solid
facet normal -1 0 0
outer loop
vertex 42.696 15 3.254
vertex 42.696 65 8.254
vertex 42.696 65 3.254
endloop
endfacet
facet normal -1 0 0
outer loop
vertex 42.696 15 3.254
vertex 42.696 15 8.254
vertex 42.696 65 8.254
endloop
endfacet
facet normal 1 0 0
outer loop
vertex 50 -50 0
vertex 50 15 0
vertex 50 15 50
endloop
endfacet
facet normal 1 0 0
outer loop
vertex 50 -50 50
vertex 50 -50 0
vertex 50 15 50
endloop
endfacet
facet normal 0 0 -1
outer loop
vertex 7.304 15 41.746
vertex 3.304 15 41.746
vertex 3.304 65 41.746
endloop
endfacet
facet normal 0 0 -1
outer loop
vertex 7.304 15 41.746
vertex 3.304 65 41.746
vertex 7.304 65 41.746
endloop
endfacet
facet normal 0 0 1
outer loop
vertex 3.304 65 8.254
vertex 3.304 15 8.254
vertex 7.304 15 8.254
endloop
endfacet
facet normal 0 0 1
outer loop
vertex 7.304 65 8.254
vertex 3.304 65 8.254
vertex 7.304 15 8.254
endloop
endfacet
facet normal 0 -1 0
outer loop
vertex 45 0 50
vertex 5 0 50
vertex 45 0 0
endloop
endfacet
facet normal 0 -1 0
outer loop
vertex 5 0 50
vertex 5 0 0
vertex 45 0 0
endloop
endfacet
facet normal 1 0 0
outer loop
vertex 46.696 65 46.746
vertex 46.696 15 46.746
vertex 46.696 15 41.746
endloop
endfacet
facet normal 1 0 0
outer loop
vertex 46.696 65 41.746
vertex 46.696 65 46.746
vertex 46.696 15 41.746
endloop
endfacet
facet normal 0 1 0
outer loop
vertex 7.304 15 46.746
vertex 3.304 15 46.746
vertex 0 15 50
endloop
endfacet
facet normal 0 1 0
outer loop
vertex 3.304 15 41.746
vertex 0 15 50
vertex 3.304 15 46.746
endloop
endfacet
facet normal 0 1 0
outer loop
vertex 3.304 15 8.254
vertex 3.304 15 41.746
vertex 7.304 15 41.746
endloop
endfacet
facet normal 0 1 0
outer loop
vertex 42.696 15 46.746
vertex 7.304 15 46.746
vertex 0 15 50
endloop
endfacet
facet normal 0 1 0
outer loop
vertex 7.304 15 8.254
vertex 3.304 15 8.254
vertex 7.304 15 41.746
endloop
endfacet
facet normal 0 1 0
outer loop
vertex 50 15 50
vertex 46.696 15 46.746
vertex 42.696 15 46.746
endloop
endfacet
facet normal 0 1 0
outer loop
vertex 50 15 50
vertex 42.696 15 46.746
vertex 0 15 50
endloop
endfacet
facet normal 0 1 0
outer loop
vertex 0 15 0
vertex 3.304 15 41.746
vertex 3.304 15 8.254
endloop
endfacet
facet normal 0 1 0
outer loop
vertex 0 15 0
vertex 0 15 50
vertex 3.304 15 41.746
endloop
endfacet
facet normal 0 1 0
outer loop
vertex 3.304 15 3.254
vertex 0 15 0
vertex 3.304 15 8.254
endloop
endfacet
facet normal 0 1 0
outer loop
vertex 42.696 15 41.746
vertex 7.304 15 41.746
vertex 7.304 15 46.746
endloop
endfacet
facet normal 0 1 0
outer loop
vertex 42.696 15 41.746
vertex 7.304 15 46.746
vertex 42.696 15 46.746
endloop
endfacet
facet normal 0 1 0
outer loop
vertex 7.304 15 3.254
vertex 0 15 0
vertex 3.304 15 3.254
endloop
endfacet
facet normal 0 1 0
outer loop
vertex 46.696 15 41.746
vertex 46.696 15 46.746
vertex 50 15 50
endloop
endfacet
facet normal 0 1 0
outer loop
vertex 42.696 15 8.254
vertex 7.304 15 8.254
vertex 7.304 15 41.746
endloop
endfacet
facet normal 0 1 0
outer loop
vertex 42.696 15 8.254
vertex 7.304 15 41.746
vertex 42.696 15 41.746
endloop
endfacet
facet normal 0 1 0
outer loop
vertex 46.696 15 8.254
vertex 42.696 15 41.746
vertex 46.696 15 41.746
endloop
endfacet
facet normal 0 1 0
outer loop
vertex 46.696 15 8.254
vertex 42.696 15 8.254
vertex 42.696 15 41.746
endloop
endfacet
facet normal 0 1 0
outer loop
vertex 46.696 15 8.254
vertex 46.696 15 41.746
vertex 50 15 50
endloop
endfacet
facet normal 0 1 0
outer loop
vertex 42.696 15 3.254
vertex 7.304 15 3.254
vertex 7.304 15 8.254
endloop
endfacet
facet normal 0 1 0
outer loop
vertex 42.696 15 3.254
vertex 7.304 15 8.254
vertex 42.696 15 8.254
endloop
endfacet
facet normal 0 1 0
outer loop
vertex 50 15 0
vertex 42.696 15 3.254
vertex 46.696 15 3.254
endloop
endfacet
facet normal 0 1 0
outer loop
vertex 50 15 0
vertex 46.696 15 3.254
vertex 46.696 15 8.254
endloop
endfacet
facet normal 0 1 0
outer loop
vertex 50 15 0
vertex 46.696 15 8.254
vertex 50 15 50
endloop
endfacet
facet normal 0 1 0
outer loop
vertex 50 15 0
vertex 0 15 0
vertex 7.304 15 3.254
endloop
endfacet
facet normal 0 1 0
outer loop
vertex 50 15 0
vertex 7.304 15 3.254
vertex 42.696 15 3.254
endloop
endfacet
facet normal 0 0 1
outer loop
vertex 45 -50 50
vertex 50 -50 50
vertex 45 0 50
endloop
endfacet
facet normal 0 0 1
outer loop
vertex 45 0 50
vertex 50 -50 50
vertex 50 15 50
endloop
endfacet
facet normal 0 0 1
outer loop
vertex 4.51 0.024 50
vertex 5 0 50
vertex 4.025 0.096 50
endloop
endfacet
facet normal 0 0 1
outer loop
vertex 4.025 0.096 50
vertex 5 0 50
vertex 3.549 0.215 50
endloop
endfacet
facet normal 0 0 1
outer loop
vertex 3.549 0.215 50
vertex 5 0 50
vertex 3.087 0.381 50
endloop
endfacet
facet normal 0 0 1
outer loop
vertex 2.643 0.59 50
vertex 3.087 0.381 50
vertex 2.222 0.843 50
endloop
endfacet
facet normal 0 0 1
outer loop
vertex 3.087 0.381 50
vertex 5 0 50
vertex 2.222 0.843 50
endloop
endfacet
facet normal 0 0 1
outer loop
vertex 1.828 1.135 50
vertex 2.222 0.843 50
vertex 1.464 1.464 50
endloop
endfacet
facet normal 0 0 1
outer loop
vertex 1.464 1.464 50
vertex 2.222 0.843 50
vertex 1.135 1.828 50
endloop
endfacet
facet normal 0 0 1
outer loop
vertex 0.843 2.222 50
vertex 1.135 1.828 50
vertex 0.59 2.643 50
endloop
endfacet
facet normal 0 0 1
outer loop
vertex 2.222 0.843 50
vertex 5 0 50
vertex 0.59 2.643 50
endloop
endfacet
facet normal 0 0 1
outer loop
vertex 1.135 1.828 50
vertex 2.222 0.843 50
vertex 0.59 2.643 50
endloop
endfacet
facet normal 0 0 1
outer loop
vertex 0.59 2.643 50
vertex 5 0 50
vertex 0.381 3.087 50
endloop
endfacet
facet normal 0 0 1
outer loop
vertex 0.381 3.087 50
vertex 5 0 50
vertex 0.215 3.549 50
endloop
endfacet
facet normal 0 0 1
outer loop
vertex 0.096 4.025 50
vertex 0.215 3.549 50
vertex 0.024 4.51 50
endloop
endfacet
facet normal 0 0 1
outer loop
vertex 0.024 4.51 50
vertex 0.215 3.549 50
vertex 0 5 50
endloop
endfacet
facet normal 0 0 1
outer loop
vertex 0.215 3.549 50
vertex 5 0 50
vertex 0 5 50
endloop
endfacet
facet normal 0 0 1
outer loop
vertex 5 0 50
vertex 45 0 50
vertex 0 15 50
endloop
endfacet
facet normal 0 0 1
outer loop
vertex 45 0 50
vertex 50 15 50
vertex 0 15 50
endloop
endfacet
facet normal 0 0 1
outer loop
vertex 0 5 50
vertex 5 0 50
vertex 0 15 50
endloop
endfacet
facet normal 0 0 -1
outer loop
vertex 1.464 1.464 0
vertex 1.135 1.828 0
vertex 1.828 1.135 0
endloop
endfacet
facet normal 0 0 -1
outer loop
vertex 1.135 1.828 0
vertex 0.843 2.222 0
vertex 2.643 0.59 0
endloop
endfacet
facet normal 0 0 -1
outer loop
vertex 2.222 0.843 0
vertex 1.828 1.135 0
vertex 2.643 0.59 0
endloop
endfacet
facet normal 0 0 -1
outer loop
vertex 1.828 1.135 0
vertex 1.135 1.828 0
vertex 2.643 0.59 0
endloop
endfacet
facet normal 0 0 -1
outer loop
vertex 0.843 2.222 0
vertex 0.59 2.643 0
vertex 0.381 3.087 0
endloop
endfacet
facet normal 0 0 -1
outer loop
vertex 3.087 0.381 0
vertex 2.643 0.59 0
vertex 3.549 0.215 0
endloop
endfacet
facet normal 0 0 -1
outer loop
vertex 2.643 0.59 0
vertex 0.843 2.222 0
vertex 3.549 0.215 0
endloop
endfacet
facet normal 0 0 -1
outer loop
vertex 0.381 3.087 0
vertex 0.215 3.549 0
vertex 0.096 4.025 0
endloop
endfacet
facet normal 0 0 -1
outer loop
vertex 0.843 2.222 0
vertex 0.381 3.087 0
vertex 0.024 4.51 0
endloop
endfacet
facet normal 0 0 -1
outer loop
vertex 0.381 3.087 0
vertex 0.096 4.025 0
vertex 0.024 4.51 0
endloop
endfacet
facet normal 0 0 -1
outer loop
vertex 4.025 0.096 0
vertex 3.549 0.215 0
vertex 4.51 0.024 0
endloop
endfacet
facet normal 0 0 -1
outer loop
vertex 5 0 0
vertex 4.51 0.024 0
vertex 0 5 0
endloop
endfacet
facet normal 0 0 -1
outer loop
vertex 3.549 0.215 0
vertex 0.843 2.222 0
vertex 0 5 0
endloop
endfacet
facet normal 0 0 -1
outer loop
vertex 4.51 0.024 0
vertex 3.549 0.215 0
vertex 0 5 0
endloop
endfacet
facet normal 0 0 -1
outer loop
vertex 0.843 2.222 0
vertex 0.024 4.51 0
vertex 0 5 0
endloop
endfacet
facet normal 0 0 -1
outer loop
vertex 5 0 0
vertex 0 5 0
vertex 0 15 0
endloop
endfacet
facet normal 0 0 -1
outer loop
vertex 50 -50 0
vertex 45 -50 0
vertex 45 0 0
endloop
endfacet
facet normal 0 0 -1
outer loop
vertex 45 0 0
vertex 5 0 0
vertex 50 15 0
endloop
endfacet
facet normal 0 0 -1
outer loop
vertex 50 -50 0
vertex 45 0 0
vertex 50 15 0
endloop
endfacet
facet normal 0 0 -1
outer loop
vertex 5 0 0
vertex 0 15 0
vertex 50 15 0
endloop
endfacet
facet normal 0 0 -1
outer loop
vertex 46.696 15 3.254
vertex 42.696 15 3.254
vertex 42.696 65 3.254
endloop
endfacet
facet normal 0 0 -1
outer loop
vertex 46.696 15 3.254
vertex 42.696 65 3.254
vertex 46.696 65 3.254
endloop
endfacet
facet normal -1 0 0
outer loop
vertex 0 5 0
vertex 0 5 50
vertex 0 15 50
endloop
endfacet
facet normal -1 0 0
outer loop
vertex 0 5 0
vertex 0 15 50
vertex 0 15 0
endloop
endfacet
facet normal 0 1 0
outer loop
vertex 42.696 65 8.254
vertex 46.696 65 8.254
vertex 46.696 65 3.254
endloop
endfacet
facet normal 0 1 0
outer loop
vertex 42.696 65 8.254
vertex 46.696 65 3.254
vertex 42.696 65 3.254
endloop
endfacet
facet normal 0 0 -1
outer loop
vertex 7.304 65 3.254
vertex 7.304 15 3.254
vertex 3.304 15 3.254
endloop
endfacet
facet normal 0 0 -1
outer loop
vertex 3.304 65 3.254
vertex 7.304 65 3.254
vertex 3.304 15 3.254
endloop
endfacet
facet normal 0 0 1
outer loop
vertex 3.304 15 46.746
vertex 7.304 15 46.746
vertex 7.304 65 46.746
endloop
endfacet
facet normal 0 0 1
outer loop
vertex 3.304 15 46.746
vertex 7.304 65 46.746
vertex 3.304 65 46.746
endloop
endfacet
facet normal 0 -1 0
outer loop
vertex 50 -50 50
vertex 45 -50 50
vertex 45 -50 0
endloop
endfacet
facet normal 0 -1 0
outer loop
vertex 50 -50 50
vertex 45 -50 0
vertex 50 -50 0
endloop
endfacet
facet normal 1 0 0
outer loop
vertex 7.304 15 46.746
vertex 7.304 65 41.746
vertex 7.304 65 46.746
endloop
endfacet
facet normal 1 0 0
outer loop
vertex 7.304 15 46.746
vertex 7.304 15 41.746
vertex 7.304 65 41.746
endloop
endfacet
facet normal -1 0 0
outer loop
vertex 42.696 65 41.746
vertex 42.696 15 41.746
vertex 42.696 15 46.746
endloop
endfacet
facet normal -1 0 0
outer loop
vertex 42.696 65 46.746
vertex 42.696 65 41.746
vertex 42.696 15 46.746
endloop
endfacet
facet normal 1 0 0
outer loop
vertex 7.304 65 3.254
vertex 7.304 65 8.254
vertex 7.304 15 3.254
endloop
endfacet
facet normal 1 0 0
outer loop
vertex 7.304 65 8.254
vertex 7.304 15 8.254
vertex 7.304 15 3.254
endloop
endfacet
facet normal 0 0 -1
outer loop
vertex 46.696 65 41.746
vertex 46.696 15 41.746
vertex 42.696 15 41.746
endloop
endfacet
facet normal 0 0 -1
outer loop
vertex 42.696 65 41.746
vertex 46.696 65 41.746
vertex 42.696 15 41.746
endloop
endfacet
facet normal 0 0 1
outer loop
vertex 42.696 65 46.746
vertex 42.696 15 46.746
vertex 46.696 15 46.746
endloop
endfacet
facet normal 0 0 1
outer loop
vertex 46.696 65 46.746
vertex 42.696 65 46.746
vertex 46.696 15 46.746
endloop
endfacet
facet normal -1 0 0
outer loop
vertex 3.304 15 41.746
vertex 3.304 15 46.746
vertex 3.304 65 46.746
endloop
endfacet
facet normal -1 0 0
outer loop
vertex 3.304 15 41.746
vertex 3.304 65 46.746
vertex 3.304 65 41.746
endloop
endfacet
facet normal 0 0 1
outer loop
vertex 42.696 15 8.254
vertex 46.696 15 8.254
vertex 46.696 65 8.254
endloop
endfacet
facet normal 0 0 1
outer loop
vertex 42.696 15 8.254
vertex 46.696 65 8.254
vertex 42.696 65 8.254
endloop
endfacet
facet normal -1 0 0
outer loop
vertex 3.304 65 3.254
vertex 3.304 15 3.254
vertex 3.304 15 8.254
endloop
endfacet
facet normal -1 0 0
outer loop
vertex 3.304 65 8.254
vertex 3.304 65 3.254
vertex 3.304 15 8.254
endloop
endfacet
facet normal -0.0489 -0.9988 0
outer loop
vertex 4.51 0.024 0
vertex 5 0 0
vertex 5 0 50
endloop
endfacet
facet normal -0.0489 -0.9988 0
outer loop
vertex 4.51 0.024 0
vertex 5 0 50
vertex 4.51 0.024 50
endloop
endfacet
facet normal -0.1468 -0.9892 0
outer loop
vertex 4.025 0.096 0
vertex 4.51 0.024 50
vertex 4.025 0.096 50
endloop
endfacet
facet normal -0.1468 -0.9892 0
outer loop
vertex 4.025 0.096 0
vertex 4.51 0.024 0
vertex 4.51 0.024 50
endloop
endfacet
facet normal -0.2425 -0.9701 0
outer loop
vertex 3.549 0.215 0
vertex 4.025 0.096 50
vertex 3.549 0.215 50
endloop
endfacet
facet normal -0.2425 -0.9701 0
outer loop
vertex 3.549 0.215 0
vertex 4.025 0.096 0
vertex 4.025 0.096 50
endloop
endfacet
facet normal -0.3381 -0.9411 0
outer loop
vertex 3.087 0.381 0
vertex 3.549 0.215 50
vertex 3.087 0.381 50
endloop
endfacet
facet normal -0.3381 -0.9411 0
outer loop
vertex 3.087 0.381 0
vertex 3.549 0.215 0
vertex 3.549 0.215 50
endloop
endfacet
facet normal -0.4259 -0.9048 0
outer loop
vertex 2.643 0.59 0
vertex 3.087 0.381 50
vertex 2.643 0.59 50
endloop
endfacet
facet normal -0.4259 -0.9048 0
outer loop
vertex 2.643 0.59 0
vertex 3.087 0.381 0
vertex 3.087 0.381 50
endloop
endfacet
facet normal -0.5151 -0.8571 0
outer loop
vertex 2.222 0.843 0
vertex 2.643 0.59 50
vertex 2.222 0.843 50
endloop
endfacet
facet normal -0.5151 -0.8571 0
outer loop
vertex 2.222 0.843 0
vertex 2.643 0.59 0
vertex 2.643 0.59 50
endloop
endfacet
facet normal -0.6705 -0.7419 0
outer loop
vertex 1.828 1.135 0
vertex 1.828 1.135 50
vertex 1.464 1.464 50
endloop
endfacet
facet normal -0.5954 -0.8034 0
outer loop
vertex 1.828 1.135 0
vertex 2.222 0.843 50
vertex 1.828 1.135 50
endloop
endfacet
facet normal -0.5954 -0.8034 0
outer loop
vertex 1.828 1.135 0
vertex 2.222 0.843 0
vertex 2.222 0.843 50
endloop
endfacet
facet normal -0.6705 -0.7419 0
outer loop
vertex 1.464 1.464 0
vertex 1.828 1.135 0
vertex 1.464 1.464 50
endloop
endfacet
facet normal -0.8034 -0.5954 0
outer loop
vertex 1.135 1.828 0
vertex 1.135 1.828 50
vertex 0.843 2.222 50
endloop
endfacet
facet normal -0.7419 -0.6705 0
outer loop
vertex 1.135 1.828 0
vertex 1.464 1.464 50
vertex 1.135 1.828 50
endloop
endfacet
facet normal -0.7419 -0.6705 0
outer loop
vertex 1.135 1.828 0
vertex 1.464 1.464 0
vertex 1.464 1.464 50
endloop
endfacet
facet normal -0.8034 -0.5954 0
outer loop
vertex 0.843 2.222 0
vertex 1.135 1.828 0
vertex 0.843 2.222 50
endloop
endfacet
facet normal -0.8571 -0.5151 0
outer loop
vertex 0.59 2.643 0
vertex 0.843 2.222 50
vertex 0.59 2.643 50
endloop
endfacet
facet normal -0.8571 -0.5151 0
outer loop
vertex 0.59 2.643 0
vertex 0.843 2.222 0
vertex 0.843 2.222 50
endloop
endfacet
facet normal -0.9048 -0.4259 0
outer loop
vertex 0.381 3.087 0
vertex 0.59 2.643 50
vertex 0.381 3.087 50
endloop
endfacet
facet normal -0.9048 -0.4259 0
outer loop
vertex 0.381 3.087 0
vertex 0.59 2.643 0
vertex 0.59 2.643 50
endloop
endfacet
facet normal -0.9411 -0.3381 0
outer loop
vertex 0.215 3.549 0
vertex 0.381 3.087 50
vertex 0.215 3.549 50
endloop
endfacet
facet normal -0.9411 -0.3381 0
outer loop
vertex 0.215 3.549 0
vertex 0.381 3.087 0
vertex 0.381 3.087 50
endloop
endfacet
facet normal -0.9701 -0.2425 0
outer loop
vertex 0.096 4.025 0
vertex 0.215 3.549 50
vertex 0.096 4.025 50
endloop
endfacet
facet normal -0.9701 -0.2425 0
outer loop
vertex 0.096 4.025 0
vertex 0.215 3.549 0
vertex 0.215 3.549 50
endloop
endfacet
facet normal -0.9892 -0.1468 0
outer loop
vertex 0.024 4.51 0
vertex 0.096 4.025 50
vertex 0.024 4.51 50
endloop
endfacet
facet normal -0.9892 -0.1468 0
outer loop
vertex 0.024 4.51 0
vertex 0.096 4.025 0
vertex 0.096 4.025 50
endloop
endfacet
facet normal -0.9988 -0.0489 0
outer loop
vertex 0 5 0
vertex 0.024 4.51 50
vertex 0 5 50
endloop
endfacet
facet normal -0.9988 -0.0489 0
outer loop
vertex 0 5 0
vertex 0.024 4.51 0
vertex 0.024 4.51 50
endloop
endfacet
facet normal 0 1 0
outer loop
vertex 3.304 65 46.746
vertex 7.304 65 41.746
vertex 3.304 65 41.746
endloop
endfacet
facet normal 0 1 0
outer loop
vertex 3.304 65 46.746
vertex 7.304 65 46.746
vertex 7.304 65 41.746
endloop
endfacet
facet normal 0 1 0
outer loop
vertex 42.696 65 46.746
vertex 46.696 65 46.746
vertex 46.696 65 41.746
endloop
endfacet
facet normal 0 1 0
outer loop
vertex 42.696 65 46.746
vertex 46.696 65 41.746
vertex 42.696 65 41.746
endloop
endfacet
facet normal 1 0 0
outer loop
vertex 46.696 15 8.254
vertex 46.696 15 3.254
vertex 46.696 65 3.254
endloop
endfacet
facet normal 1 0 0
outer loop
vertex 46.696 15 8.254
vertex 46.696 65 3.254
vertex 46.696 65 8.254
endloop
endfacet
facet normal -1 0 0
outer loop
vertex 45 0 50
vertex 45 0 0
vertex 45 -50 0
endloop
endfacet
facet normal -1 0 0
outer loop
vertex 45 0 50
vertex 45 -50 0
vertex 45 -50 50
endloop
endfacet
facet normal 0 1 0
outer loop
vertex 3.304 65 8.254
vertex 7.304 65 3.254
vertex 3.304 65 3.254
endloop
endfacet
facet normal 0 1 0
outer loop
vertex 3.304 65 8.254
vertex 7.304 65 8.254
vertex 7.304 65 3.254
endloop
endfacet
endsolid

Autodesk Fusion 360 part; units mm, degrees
sketch "Sketch1" plane through (0, 0, 0) normal (0, 1, 0) x (1, 0, 0)
  line L0 (0, 0) -> (50, 0)
  line L1 (50, 0) -> (50, -50)
  line L2 (50, -50) -> (0, -50)
  line L3 (0, -50) -> (0, 0)
  dimension "d1" = 50
  dimension "d2" = 50
extrude "Extrude1" add sketch "Sketch1" along normal blind 15
sketch "Sketch2" plane through (0, 15, 0) normal (0, 1, 0) x (-1, 0, 0)
  line L0 (0, 50) -> (-50, 50)
  line L1 (-50, 50) -> (-50, 0)
  line L2 (-50, 0) -> (0, 0)
  line L3 (0, 0) -> (0, 50)
  line L4 (-25, 50) -> (-25, 0) construction
  line L5 (0, 25) -> (-50, 25) construction
  line L6 (-46.6959, 41.7465) -> (-42.6959, 41.7465)
  line L7 (-42.6959, 41.7465) -> (-42.6959, 46.7465)
  line L8 (-42.6959, 46.7465) -> (-46.6959, 46.7465)
  line L9 (-46.6959, 46.7465) -> (-46.6959, 41.7465)
  line L10 (-42.6959, 3.2535) -> (-46.6959, 3.2535)
  line L11 (-46.6959, 3.2535) -> (-46.6959, 8.2535)
  line L12 (-46.6959, 8.2535) -> (-42.6959, 8.2535)
  line L13 (-42.6959, 8.2535) -> (-42.6959, 3.2535)
  line L14 (-3.3041, 41.7465) -> (-7.3041, 41.7465)
  line L15 (-3.3041, 46.7465) -> (-3.3041, 41.7465)
  line L16 (-7.3041, 41.7465) -> (-7.3041, 46.7465)
  line L17 (-7.3041, 46.7465) -> (-3.3041, 46.7465)
  line L18 (-7.3041, 8.2535) -> (-7.3041, 3.2535)
  line L19 (-3.3041, 8.2535) -> (-7.3041, 8.2535)
  line L20 (-3.3041, 3.2535) -> (-3.3041, 8.2535)
  line L21 (-7.3041, 3.2535) -> (-3.3041, 3.2535)
  dimension "d5" = 5
  dimension "d6" = 4
extrude "Extrude2" add sketch "Sketch2" along normal blind 50 contours L6 L7 L8 L9 | L10 L11 L12 L13 | L14 L15 L16 L17 | L18 L19 L20 L21
fillet "Fillet1" radius 5 1 edges at (0, 0, 25)
sketch "Sketch3" plane through (0, 0, 0) normal (0, -1, 0) x (1, 0, 0)
  line L0 (5, 50) -> (5, 0)
  line L1 (5, 0) -> (50, 0)
  line L2 (50, 0) -> (50, 50)
  line L3 (50, 50) -> (5, 50)
  line L4 (50, 0) -> (45, 0)
  line L5 (45, 0) -> (45, 50)
  line L6 (45, 50) -> (50, 50)
  line L7 (50, 50) -> (50, 0)
  dimension "d11" = 5
  dimension "d12" = 50
extrude "Extrude3" add sketch "Sketch3" along normal blind 50 contours L1 L2 L3 L4 L5 L6 L7
